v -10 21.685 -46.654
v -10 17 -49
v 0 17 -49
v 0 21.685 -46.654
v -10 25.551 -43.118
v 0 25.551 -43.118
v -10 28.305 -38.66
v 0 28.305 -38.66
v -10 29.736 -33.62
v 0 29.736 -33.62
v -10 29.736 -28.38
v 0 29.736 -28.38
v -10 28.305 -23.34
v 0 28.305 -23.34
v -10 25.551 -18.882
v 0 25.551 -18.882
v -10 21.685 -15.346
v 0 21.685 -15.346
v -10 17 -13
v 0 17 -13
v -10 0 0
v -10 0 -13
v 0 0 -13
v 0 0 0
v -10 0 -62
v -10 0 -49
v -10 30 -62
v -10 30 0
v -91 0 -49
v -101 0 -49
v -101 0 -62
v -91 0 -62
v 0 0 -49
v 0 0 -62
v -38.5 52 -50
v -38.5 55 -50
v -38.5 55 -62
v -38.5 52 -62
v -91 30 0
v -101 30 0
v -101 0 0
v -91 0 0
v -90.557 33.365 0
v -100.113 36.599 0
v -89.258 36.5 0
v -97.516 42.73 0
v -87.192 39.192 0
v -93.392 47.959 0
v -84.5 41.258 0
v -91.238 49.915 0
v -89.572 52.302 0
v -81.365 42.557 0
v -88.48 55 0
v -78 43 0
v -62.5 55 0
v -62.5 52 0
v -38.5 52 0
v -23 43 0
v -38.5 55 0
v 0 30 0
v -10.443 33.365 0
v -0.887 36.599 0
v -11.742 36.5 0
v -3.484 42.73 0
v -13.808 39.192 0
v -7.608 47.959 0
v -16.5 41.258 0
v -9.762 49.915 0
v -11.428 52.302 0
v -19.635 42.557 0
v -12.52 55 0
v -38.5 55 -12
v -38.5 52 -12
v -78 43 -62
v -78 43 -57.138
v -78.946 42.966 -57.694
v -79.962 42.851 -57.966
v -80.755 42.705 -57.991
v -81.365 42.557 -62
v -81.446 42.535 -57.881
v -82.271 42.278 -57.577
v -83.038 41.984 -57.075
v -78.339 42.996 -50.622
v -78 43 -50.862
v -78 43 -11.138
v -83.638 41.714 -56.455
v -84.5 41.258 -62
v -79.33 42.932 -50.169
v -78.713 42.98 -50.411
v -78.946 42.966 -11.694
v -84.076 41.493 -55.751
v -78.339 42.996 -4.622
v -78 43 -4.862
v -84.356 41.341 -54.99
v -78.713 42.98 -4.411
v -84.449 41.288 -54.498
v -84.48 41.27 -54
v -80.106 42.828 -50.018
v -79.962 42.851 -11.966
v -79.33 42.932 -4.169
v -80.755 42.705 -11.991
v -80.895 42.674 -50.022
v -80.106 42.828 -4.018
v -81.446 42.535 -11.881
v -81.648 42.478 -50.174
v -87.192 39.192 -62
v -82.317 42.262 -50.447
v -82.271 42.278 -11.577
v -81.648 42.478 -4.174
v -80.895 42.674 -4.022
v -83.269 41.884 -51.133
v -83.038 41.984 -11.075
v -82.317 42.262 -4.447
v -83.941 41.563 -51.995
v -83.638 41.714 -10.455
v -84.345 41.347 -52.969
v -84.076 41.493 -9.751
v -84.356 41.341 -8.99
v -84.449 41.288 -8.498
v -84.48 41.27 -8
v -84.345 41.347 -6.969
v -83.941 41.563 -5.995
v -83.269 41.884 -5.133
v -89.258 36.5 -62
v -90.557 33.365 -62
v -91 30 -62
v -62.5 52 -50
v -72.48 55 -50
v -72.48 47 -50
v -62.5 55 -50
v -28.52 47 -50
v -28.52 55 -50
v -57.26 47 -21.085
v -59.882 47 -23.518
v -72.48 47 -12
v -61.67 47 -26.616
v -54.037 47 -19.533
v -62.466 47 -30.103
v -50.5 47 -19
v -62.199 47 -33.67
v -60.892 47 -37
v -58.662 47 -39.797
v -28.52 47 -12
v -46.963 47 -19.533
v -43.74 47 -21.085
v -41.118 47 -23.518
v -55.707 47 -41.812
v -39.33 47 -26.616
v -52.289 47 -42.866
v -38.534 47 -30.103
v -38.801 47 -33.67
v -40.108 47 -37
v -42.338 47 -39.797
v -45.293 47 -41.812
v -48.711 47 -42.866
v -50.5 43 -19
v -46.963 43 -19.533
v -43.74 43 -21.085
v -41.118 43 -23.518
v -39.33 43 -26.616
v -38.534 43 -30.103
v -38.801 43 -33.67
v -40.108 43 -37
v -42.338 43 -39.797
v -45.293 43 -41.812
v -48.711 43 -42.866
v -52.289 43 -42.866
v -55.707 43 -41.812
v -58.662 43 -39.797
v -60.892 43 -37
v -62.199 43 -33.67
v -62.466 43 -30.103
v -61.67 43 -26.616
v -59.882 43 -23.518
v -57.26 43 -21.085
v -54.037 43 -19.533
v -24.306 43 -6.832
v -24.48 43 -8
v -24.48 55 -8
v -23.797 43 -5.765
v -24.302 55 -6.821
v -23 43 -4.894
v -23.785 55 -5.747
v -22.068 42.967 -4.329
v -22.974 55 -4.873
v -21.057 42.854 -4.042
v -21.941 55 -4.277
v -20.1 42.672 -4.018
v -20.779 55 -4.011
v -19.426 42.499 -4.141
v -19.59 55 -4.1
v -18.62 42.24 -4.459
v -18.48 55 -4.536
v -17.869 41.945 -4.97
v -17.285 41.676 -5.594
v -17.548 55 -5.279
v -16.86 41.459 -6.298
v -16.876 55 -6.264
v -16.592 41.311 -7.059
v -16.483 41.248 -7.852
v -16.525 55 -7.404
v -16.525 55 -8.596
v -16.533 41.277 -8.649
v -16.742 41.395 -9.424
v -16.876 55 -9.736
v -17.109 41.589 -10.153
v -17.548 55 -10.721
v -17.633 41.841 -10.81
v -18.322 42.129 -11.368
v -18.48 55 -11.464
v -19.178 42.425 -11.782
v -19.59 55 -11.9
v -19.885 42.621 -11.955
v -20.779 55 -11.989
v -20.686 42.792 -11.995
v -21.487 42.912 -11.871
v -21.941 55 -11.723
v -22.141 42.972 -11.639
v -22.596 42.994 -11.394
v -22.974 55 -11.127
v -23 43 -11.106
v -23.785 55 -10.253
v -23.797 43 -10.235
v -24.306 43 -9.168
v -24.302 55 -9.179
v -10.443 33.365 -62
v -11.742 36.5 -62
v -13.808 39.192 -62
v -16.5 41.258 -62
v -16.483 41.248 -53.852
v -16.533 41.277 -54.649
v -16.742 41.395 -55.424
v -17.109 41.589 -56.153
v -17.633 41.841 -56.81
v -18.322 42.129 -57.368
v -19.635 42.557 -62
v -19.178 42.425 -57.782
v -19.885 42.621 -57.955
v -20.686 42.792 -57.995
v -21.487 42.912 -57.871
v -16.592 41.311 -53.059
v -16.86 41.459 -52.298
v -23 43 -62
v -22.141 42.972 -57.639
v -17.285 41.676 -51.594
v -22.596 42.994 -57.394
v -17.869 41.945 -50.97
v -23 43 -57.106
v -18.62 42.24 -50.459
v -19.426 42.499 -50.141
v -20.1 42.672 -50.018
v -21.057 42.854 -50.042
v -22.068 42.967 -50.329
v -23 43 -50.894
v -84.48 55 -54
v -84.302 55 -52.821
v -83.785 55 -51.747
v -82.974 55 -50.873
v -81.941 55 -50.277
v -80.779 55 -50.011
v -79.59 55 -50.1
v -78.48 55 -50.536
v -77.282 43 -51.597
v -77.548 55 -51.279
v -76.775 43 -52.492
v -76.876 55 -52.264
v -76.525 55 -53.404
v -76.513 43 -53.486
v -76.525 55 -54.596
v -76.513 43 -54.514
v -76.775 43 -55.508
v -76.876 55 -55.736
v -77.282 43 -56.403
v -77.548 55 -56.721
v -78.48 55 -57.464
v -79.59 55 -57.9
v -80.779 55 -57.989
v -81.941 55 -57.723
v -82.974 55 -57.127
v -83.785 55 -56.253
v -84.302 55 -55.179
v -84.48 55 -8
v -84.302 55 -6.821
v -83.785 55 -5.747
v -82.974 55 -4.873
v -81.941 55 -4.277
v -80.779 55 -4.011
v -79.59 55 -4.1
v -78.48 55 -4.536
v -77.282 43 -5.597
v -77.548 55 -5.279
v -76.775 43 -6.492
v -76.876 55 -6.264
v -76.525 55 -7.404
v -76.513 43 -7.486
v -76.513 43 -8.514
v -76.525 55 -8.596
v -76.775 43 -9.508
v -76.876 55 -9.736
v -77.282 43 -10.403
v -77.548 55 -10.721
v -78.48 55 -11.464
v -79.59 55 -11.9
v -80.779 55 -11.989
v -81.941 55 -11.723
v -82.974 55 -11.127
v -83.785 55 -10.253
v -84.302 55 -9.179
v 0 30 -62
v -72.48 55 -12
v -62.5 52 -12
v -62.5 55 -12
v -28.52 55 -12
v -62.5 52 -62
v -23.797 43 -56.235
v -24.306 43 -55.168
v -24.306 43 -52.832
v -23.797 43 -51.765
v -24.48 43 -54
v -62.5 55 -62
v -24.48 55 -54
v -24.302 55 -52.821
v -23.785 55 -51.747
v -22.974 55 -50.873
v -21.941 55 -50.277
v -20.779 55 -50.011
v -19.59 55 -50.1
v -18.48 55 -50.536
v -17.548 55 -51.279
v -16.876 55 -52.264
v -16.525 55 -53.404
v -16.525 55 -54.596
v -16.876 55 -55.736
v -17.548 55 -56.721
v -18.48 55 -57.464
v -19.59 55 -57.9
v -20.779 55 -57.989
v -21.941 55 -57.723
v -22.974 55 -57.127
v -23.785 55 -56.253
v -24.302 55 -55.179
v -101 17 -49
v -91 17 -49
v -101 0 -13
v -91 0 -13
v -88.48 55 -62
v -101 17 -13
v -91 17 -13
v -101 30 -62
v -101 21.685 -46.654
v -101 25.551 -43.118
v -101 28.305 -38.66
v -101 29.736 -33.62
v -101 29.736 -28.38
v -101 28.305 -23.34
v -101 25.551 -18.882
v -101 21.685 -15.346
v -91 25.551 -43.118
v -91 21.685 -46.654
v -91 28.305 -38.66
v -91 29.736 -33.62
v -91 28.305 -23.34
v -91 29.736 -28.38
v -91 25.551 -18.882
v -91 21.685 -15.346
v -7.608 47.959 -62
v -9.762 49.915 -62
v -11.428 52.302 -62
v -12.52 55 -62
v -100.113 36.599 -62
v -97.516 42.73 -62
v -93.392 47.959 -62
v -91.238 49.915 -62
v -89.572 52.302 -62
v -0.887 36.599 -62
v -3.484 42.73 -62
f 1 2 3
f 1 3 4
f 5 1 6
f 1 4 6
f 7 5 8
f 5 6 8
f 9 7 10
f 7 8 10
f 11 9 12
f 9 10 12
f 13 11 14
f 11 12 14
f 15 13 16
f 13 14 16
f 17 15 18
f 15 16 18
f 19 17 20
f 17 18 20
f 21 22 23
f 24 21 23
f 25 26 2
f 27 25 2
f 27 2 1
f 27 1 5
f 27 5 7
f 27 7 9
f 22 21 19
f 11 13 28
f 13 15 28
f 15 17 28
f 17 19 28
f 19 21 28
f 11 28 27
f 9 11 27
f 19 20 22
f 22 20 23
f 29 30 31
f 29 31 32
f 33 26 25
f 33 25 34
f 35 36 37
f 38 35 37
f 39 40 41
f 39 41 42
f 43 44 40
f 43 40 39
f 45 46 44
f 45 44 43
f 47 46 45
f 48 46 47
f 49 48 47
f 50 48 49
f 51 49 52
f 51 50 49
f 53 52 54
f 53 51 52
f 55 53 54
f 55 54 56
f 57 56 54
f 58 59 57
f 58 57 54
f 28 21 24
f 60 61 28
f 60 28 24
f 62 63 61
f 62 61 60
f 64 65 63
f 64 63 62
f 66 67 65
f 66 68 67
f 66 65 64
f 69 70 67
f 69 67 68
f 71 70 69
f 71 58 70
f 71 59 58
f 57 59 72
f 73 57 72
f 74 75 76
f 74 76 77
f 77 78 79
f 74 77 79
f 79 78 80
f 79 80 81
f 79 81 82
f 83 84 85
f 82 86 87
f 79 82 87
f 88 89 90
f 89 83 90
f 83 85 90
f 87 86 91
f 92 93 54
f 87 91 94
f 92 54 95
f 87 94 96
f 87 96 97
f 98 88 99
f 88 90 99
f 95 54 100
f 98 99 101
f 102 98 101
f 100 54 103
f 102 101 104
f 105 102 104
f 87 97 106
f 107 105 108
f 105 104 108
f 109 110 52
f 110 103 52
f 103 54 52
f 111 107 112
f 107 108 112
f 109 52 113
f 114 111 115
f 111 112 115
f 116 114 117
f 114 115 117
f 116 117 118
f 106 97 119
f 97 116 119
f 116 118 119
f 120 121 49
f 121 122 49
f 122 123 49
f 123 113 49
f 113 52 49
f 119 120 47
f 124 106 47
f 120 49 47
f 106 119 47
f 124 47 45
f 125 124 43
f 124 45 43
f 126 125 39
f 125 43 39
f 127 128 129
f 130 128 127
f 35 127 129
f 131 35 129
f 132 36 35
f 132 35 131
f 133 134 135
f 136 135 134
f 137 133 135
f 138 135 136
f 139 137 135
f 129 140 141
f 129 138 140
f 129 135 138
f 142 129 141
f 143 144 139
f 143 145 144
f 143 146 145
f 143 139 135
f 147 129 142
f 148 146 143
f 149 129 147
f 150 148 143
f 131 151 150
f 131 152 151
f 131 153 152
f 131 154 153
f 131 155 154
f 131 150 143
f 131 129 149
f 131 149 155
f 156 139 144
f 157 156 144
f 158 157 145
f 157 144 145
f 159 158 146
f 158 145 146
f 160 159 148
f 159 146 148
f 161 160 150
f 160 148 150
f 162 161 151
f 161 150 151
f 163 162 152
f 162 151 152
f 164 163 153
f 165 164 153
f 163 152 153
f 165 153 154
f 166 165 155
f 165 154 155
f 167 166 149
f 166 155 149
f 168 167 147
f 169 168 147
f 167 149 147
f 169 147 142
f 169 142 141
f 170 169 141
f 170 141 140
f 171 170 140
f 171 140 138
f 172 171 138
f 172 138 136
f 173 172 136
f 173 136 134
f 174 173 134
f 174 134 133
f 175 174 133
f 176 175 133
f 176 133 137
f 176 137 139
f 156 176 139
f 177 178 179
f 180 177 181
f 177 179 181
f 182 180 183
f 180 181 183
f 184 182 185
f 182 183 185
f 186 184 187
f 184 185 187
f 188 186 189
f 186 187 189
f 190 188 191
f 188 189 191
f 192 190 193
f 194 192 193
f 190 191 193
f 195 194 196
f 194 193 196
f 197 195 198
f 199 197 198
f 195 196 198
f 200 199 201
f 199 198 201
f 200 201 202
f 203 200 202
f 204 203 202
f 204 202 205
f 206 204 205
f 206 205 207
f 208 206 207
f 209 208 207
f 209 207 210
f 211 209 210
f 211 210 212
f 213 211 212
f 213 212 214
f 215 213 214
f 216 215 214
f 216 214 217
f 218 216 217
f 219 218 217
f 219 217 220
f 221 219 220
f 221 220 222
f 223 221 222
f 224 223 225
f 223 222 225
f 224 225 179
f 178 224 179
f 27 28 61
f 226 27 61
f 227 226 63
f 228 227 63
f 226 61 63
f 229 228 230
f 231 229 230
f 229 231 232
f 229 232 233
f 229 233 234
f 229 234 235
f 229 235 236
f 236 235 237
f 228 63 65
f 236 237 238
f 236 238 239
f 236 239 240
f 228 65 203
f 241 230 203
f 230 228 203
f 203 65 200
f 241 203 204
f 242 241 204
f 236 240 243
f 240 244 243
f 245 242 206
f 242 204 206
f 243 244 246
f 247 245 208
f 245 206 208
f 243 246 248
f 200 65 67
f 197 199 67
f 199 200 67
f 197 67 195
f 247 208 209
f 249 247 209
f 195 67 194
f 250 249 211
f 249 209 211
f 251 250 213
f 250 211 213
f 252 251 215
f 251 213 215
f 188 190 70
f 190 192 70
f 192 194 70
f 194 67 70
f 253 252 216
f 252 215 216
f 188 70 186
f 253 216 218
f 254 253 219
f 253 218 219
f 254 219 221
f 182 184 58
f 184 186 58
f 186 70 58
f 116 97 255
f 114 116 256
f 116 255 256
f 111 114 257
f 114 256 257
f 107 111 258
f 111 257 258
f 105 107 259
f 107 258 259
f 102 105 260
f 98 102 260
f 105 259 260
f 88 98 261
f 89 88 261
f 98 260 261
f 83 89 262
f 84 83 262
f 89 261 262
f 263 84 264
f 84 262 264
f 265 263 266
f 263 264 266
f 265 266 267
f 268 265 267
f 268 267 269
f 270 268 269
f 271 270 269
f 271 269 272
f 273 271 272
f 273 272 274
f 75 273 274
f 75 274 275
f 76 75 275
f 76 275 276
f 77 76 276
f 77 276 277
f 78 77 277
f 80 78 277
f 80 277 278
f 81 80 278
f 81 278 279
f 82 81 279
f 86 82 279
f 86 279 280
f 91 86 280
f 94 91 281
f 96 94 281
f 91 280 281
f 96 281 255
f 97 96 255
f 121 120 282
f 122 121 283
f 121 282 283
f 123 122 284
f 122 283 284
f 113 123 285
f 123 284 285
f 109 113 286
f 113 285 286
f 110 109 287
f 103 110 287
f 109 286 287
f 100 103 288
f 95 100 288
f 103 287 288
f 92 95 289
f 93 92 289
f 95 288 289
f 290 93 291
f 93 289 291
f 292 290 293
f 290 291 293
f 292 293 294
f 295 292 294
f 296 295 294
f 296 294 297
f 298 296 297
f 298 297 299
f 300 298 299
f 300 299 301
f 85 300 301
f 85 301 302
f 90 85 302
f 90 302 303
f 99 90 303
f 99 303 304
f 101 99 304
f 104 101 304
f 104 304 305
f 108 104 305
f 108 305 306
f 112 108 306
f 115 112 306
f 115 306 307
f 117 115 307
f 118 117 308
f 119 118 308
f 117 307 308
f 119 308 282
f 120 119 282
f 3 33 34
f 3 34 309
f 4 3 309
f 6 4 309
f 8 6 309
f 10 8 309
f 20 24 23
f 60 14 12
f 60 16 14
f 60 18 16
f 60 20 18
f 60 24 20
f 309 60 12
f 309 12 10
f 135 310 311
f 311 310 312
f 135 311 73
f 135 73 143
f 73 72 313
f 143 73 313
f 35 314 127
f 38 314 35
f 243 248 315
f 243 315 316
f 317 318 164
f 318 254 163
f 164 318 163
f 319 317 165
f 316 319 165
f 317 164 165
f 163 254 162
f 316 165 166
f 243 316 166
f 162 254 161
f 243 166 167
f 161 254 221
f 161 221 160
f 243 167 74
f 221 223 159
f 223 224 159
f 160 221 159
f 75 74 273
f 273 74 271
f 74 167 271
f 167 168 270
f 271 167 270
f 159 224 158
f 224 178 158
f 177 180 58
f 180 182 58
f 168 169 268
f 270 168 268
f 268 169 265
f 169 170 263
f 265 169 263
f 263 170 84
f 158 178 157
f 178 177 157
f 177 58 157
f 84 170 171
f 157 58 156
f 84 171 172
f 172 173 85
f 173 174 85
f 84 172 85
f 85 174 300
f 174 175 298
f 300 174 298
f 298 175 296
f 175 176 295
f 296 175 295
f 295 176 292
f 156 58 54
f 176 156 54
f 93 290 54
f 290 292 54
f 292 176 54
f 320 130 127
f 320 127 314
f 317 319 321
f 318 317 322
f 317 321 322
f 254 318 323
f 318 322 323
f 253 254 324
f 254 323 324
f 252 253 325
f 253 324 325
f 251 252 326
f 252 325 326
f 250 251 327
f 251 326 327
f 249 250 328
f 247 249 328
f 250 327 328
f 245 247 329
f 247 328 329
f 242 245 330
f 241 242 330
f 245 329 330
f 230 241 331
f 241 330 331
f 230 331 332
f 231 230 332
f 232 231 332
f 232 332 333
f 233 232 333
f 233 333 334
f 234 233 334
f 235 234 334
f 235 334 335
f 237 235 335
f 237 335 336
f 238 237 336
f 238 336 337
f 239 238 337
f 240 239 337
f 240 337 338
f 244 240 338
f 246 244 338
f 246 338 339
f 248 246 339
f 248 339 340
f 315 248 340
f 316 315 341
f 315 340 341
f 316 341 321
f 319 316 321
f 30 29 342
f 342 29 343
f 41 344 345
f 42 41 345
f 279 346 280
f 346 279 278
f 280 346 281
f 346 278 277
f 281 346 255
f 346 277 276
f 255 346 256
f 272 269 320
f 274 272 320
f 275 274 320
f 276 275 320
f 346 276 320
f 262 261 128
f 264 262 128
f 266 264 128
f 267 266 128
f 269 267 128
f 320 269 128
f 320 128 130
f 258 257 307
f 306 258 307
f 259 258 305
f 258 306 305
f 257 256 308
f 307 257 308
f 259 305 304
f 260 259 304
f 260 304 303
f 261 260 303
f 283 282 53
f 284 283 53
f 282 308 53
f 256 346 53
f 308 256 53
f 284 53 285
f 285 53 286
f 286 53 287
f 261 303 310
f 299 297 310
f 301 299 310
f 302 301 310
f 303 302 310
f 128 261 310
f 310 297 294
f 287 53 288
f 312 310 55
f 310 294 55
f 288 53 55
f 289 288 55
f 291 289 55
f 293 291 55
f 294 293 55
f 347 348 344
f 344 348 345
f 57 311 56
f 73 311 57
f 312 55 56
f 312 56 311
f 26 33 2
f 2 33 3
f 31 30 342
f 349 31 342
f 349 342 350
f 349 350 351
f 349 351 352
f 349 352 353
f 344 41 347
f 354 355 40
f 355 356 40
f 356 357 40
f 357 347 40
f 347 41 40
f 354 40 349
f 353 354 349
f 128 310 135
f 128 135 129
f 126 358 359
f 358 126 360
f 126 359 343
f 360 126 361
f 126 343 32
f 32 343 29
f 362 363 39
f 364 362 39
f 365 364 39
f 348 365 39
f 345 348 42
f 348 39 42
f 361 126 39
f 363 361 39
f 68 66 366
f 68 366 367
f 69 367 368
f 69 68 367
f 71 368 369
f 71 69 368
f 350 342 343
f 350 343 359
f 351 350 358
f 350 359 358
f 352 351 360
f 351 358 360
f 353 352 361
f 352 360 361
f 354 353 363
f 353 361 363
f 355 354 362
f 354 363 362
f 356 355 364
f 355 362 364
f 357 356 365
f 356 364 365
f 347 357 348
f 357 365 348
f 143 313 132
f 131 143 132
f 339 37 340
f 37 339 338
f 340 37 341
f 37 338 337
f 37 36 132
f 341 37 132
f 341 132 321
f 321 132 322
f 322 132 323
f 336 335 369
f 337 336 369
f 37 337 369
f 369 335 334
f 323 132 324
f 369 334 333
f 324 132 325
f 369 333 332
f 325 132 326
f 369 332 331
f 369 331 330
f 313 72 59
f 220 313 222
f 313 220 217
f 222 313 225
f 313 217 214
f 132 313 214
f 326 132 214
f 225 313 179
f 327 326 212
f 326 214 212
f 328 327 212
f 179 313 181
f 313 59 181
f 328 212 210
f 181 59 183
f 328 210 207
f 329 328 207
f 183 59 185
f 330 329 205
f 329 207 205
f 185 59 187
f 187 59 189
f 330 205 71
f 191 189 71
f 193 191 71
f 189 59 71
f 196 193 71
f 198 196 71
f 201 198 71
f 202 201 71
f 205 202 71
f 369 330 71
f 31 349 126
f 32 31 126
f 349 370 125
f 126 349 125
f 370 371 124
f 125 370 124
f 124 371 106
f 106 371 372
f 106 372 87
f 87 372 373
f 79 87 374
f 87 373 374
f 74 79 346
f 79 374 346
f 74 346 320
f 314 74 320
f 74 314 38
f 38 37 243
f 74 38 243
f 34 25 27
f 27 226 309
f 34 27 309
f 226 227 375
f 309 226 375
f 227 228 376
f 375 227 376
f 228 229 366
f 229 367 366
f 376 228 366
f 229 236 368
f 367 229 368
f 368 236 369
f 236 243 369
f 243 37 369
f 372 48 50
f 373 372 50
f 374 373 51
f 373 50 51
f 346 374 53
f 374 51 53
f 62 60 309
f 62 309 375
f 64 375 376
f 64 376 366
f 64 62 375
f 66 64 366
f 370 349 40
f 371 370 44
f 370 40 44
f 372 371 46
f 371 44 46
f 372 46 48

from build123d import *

# Parameters (mm, degrees)
SCHIZZO1_W                   = 101
SCHIZZO1_H                   = 55
ESTRUSIONE_ESTRUSIONE1_DEPTH = 62
TAGLIO_ESTRUSIONE1_DEPTH     = 131.652210085
TAGLIO_ESTRUSIONE2_DEPTH     = 131.652210085
TAGLIO_ESTRUSIONE4_DEPTH     = 131.652210085
SCHIZZO8_W                   = 24
SCHIZZO8_H                   = 62
TAGLIO_ESTRUSIONE5_DEPTH     = 3
SCHIZZO9_W                   = 43.960031948
SCHIZZO9_H                   = 38
TAGLIO_ESTRUSIONE6_DEPTH     = 8
SCHIZZO10_R                  = 12
TAGLIO_ESTRUSIONE7_DEPTH     = 128.491176165
SCHIZZO11_R                  = 4
TAGLIO_ESTRUSIONE8_DEPTH     = 131.652210085


with BuildPart() as part:
    # Schizzo1 → Estrusione-Estrusione1 (new body)
    with BuildSketch(Plane.XY):
        with Locations((-50.5, 27.5)):
            Rectangle(SCHIZZO1_W, SCHIZZO1_H)
    extrude(amount=-ESTRUSIONE_ESTRUSIONE1_DEPTH)

    # Schizzo2 → Taglio-Estrusione1 (cut, through all)
    with BuildSketch(Plane(origin=(0, 0, 0), x_dir=(0, 0, -1), z_dir=(1, 0, 0))):
        with BuildLine():
            Line((13, 0), (49, 0))
            Line((49, 0), (49, 17))
            ThreePointArc((49, 17), (31, 29.91723747), (13, 17))
            Line((13, 17), (13, 0))
        make_face()
    extrude(amount=-TAGLIO_ESTRUSIONE1_DEPTH, mode=Mode.SUBTRACT)

    # Schizzo3 → Taglio-Estrusione2 (cut, through all)
    with BuildSketch(Plane.XY):
        with BuildLine():
            Line((-91, 0), (-10, 0))
            Line((-10, 0), (-10, 30))
            ThreePointArc((-10, 30), (-13.807611845, 39.192388155), (-23, 43))
            Line((-23, 43), (-78, 43))
            ThreePointArc((-78, 43), (-87.192388155, 39.192388155), (-91, 30))
            Line((-91, 30), (-91, 0))
        make_face()
    extrude(amount=-TAGLIO_ESTRUSIONE2_DEPTH, mode=Mode.SUBTRACT)

    # Schizzo7 → Taglio-Estrusione4 (cut, through all)
    with BuildSketch(Plane.XY):
        with BuildLine():
            Line((0, 55), (0, 30))
            ThreePointArc((0, 30), (-1.980372958, 39.751757321), (-7.607741667, 47.958545322))
            ThreePointArc((-7.607741667, 47.958545322), (-10.661934927, 51.062047082), (-12.519984026, 55))
            Line((-12.519984026, 55), (0, 55))
        make_face()
        with BuildLine():
            Line((-101, 55), (-101, 30))
            ThreePointArc((-101, 30), (-99.019627042, 39.751757321), (-93.392258333, 47.958545322))
            ThreePointArc((-93.392258333, 47.958545322), (-90.338065073, 51.062047082), (-88.480015974, 55))
            Line((-88.480015974, 55), (-101, 55))
        make_face()
    extrude(amount=-TAGLIO_ESTRUSIONE4_DEPTH, mode=Mode.SUBTRACT)

    # Schizzo8 → Taglio-Estrusione5 (cut)
    with BuildSketch(Plane(origin=(0, 55, 0), x_dir=(1, 0, 0), z_dir=(0, 1, 0))):
        with Locations((-50.5, 31)):
            Rectangle(SCHIZZO8_W, SCHIZZO8_H)
    extrude(amount=-TAGLIO_ESTRUSIONE5_DEPTH, mode=Mode.SUBTRACT)

    # Schizzo9 → Taglio-Estrusione6 (cut)
    with BuildSketch(Plane(origin=(0, 55, 0), x_dir=(1, 0, 0), z_dir=(0, 1, 0))):
        with Locations((-50.5, 31)):
            Rectangle(SCHIZZO9_W, SCHIZZO9_H)
    extrude(amount=-TAGLIO_ESTRUSIONE6_DEPTH, mode=Mode.SUBTRACT)

    # Schizzo10 → Taglio-Estrusione7 (cut, through all)
    with BuildSketch(Plane(origin=(0, 47, 0), x_dir=(1, 0, 0), z_dir=(0, 1, 0))):
        with Locations(Location((-50.5, 31, 0), (0, 0, 270))):
            Circle(SCHIZZO10_R)
    extrude(amount=-TAGLIO_ESTRUSIONE7_DEPTH, mode=Mode.SUBTRACT)

    # Schizzo11 → Taglio-Estrusione8 (cut, through all)
    with BuildSketch(Plane(origin=(0, 55, 0), x_dir=(1, 0, 0), z_dir=(0, 1, 0))):
        with Locations(Location((-80.480015974, 54, 0), (0, 0, 180))):
            Circle(SCHIZZO11_R)
        with Locations(Location((-20.480015974, 54, 0), (0, 0, 180))):
            Circle(SCHIZZO11_R)
        with Locations(Location((-20.480015974, 8, 0), (0, 0, 180))):
            Circle(SCHIZZO11_R)
        with Locations(Location((-80.480015974, 8, 0), (0, 0, 180))):
            Circle(SCHIZZO11_R)
    extrude(amount=-TAGLIO_ESTRUSIONE8_DEPTH, mode=Mode.SUBTRACT)


solid = part.part
